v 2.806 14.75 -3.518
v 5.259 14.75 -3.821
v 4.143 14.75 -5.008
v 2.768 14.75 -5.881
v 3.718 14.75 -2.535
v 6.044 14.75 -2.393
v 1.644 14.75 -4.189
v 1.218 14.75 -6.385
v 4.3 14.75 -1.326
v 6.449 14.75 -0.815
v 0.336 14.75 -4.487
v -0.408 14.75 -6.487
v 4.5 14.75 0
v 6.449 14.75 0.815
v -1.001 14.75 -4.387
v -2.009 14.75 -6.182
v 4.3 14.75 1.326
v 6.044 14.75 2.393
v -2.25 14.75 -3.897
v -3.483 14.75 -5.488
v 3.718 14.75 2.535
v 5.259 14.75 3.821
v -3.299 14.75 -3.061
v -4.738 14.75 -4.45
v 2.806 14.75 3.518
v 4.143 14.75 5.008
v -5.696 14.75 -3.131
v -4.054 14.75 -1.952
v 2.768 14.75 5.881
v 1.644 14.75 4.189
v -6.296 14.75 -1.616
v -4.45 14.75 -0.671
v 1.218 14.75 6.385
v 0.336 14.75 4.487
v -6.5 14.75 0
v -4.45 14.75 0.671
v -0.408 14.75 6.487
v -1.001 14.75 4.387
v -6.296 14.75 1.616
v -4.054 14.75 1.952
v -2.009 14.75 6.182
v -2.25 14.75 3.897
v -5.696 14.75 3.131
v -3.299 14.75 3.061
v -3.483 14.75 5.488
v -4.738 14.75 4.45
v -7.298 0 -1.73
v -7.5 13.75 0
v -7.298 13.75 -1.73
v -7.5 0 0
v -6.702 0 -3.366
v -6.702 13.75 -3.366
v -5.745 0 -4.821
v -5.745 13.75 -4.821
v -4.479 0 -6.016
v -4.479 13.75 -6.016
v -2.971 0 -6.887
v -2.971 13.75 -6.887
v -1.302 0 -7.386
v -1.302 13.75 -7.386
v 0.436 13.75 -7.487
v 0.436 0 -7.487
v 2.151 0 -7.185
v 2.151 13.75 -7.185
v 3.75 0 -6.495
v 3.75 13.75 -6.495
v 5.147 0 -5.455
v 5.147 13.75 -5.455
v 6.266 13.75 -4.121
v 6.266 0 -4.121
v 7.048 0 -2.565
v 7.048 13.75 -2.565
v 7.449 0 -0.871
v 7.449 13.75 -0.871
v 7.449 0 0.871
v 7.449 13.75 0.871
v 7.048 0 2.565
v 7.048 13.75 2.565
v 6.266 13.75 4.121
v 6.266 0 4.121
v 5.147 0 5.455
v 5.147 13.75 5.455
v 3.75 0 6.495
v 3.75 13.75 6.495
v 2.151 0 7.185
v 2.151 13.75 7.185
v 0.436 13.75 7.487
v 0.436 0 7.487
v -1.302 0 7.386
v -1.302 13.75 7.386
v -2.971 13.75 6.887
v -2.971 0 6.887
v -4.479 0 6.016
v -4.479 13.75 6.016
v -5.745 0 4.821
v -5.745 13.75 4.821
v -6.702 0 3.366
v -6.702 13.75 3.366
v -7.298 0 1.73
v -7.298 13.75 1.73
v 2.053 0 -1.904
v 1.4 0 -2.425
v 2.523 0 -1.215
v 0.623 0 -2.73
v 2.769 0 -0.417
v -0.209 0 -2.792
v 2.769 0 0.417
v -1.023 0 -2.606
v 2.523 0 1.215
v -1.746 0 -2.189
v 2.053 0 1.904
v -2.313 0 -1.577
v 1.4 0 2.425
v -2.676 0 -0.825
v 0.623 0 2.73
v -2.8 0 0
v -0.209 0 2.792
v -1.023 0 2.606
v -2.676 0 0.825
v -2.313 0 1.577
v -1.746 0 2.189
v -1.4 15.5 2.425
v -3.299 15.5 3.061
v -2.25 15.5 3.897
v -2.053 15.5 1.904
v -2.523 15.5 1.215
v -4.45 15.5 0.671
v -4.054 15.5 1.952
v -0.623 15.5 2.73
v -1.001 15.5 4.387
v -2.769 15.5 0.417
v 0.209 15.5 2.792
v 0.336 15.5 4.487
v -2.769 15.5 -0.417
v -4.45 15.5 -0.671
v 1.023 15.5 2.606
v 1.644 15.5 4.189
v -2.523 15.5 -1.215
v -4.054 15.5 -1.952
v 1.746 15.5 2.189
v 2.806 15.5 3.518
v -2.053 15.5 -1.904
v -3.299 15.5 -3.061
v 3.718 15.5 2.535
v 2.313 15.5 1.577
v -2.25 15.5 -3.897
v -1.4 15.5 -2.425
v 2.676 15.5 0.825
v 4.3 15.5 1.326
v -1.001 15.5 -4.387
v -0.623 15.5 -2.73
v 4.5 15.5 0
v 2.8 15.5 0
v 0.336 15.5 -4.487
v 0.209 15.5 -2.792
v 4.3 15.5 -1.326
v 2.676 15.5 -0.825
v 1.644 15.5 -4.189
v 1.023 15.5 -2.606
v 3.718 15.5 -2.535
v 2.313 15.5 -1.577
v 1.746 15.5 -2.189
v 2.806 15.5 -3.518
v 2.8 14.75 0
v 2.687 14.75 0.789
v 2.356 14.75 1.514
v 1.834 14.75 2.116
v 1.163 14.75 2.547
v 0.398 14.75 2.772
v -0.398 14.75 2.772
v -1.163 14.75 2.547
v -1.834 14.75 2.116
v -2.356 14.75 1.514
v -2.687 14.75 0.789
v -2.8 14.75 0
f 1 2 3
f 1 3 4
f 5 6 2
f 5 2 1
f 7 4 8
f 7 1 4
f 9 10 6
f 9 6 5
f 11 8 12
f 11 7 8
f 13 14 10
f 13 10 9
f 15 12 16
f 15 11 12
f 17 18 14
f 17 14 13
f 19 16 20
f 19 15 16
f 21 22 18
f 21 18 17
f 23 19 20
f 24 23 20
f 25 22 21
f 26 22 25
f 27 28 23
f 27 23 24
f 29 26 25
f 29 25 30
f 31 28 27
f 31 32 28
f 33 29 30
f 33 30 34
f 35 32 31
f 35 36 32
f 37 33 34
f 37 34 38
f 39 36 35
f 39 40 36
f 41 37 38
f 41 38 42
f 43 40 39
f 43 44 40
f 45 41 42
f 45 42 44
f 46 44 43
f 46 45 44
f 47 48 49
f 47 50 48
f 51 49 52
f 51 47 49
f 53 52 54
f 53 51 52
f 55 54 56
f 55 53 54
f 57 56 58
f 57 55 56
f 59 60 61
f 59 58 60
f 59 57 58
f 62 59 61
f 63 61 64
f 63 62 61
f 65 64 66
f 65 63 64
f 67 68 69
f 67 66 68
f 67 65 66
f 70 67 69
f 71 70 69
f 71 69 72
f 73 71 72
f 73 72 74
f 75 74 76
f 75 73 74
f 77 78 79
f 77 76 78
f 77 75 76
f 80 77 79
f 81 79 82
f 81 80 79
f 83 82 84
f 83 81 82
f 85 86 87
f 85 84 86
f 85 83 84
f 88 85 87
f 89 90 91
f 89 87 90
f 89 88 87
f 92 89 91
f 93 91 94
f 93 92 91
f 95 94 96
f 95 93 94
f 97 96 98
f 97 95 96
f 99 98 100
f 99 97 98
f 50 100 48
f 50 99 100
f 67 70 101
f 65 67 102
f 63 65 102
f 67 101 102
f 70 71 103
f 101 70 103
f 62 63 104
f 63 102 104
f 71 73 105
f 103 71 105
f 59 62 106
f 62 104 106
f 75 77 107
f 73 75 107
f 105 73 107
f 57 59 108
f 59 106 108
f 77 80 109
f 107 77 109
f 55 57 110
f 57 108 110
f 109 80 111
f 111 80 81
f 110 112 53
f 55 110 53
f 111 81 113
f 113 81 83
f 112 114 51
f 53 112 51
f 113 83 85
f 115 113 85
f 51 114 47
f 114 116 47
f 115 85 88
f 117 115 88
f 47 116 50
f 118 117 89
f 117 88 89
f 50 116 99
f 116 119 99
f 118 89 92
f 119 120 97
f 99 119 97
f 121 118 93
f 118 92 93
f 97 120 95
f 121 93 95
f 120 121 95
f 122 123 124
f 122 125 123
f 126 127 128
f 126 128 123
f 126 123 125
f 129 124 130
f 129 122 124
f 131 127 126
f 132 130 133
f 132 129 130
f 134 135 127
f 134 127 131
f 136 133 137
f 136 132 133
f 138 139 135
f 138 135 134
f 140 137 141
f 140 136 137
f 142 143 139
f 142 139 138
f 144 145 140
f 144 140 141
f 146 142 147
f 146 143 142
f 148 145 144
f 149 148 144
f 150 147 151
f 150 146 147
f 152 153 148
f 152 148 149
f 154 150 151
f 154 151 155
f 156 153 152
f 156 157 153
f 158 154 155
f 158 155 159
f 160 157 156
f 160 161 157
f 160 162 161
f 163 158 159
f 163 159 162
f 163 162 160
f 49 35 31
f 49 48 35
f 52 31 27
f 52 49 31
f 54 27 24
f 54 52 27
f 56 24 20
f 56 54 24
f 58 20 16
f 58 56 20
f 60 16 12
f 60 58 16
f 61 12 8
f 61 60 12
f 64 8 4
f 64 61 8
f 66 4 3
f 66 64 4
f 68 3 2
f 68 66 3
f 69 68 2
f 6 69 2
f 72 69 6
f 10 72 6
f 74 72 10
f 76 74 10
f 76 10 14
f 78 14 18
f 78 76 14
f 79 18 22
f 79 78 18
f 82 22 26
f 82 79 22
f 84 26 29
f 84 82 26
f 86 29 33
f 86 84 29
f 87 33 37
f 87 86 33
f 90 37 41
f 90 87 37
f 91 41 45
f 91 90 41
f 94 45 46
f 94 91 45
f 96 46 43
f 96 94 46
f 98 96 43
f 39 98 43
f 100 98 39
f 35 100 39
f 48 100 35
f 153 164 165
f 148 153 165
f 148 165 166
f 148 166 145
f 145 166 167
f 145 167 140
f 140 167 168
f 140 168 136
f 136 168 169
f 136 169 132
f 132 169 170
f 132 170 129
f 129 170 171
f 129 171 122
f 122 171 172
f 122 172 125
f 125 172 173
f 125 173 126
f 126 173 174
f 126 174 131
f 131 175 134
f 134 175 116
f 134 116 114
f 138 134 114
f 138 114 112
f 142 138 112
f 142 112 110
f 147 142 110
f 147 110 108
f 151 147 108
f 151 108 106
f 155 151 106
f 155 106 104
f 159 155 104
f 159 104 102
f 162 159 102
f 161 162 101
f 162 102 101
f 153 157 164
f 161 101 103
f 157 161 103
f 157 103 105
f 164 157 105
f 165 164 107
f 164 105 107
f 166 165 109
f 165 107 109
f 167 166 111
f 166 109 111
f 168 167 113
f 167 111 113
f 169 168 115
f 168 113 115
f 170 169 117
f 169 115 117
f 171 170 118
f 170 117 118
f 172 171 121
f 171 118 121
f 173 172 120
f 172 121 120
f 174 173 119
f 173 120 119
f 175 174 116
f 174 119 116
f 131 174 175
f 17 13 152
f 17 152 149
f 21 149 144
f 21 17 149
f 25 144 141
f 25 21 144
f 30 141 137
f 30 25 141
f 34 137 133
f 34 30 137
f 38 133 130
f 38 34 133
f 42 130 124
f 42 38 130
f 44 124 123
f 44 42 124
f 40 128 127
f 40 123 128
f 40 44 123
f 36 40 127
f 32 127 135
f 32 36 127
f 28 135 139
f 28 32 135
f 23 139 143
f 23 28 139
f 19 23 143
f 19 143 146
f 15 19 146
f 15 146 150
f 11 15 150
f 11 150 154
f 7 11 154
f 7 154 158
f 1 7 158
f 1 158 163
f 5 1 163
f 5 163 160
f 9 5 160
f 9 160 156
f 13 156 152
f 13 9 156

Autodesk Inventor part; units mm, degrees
ref_plane "YZ Plane" through (0, 0, 0) normal (1, 0, 0) x (0, 1, 0)
ref_plane "XZ Plane" through (0, 0, 0) normal (0, 1, 0) x (-1, 0, 0)
ref_plane "XY Plane" through (0, 0, 0) normal (0, 0, 1) x (1, 0, 0)
sketch "Sketch1" plane through (0, 0, 0) normal (0, 1, 0) x (-1, 0, 0)
  circle A0 centre (0, 0) radius 2.8
  circle A1 centre (0, 0) radius 7.5
  dimension "d0" = 5.6
  dimension "d1" = 15
extrude "Extrusion1" add sketch "Sketch1" along normal blind 14.75
sketch "Sketch2" plane through (0, 14.75, 0) normal (0, 1, 0) x (1, 0, 0)
  circle A0 centre (0, 0) radius 4.5
  circle A1 centre (0, 0) radius 2.8 projected
  dimension "d4" = 9
extrude "Extrusion2" add sketch "Sketch2" along normal blind 0.75
chamfer "Chamfer1" distance 1 angle 45 1 edges at (7.5, 14.75, 0)
properties part number "x carraige sliding spacer long" material "ABS Plastic"
